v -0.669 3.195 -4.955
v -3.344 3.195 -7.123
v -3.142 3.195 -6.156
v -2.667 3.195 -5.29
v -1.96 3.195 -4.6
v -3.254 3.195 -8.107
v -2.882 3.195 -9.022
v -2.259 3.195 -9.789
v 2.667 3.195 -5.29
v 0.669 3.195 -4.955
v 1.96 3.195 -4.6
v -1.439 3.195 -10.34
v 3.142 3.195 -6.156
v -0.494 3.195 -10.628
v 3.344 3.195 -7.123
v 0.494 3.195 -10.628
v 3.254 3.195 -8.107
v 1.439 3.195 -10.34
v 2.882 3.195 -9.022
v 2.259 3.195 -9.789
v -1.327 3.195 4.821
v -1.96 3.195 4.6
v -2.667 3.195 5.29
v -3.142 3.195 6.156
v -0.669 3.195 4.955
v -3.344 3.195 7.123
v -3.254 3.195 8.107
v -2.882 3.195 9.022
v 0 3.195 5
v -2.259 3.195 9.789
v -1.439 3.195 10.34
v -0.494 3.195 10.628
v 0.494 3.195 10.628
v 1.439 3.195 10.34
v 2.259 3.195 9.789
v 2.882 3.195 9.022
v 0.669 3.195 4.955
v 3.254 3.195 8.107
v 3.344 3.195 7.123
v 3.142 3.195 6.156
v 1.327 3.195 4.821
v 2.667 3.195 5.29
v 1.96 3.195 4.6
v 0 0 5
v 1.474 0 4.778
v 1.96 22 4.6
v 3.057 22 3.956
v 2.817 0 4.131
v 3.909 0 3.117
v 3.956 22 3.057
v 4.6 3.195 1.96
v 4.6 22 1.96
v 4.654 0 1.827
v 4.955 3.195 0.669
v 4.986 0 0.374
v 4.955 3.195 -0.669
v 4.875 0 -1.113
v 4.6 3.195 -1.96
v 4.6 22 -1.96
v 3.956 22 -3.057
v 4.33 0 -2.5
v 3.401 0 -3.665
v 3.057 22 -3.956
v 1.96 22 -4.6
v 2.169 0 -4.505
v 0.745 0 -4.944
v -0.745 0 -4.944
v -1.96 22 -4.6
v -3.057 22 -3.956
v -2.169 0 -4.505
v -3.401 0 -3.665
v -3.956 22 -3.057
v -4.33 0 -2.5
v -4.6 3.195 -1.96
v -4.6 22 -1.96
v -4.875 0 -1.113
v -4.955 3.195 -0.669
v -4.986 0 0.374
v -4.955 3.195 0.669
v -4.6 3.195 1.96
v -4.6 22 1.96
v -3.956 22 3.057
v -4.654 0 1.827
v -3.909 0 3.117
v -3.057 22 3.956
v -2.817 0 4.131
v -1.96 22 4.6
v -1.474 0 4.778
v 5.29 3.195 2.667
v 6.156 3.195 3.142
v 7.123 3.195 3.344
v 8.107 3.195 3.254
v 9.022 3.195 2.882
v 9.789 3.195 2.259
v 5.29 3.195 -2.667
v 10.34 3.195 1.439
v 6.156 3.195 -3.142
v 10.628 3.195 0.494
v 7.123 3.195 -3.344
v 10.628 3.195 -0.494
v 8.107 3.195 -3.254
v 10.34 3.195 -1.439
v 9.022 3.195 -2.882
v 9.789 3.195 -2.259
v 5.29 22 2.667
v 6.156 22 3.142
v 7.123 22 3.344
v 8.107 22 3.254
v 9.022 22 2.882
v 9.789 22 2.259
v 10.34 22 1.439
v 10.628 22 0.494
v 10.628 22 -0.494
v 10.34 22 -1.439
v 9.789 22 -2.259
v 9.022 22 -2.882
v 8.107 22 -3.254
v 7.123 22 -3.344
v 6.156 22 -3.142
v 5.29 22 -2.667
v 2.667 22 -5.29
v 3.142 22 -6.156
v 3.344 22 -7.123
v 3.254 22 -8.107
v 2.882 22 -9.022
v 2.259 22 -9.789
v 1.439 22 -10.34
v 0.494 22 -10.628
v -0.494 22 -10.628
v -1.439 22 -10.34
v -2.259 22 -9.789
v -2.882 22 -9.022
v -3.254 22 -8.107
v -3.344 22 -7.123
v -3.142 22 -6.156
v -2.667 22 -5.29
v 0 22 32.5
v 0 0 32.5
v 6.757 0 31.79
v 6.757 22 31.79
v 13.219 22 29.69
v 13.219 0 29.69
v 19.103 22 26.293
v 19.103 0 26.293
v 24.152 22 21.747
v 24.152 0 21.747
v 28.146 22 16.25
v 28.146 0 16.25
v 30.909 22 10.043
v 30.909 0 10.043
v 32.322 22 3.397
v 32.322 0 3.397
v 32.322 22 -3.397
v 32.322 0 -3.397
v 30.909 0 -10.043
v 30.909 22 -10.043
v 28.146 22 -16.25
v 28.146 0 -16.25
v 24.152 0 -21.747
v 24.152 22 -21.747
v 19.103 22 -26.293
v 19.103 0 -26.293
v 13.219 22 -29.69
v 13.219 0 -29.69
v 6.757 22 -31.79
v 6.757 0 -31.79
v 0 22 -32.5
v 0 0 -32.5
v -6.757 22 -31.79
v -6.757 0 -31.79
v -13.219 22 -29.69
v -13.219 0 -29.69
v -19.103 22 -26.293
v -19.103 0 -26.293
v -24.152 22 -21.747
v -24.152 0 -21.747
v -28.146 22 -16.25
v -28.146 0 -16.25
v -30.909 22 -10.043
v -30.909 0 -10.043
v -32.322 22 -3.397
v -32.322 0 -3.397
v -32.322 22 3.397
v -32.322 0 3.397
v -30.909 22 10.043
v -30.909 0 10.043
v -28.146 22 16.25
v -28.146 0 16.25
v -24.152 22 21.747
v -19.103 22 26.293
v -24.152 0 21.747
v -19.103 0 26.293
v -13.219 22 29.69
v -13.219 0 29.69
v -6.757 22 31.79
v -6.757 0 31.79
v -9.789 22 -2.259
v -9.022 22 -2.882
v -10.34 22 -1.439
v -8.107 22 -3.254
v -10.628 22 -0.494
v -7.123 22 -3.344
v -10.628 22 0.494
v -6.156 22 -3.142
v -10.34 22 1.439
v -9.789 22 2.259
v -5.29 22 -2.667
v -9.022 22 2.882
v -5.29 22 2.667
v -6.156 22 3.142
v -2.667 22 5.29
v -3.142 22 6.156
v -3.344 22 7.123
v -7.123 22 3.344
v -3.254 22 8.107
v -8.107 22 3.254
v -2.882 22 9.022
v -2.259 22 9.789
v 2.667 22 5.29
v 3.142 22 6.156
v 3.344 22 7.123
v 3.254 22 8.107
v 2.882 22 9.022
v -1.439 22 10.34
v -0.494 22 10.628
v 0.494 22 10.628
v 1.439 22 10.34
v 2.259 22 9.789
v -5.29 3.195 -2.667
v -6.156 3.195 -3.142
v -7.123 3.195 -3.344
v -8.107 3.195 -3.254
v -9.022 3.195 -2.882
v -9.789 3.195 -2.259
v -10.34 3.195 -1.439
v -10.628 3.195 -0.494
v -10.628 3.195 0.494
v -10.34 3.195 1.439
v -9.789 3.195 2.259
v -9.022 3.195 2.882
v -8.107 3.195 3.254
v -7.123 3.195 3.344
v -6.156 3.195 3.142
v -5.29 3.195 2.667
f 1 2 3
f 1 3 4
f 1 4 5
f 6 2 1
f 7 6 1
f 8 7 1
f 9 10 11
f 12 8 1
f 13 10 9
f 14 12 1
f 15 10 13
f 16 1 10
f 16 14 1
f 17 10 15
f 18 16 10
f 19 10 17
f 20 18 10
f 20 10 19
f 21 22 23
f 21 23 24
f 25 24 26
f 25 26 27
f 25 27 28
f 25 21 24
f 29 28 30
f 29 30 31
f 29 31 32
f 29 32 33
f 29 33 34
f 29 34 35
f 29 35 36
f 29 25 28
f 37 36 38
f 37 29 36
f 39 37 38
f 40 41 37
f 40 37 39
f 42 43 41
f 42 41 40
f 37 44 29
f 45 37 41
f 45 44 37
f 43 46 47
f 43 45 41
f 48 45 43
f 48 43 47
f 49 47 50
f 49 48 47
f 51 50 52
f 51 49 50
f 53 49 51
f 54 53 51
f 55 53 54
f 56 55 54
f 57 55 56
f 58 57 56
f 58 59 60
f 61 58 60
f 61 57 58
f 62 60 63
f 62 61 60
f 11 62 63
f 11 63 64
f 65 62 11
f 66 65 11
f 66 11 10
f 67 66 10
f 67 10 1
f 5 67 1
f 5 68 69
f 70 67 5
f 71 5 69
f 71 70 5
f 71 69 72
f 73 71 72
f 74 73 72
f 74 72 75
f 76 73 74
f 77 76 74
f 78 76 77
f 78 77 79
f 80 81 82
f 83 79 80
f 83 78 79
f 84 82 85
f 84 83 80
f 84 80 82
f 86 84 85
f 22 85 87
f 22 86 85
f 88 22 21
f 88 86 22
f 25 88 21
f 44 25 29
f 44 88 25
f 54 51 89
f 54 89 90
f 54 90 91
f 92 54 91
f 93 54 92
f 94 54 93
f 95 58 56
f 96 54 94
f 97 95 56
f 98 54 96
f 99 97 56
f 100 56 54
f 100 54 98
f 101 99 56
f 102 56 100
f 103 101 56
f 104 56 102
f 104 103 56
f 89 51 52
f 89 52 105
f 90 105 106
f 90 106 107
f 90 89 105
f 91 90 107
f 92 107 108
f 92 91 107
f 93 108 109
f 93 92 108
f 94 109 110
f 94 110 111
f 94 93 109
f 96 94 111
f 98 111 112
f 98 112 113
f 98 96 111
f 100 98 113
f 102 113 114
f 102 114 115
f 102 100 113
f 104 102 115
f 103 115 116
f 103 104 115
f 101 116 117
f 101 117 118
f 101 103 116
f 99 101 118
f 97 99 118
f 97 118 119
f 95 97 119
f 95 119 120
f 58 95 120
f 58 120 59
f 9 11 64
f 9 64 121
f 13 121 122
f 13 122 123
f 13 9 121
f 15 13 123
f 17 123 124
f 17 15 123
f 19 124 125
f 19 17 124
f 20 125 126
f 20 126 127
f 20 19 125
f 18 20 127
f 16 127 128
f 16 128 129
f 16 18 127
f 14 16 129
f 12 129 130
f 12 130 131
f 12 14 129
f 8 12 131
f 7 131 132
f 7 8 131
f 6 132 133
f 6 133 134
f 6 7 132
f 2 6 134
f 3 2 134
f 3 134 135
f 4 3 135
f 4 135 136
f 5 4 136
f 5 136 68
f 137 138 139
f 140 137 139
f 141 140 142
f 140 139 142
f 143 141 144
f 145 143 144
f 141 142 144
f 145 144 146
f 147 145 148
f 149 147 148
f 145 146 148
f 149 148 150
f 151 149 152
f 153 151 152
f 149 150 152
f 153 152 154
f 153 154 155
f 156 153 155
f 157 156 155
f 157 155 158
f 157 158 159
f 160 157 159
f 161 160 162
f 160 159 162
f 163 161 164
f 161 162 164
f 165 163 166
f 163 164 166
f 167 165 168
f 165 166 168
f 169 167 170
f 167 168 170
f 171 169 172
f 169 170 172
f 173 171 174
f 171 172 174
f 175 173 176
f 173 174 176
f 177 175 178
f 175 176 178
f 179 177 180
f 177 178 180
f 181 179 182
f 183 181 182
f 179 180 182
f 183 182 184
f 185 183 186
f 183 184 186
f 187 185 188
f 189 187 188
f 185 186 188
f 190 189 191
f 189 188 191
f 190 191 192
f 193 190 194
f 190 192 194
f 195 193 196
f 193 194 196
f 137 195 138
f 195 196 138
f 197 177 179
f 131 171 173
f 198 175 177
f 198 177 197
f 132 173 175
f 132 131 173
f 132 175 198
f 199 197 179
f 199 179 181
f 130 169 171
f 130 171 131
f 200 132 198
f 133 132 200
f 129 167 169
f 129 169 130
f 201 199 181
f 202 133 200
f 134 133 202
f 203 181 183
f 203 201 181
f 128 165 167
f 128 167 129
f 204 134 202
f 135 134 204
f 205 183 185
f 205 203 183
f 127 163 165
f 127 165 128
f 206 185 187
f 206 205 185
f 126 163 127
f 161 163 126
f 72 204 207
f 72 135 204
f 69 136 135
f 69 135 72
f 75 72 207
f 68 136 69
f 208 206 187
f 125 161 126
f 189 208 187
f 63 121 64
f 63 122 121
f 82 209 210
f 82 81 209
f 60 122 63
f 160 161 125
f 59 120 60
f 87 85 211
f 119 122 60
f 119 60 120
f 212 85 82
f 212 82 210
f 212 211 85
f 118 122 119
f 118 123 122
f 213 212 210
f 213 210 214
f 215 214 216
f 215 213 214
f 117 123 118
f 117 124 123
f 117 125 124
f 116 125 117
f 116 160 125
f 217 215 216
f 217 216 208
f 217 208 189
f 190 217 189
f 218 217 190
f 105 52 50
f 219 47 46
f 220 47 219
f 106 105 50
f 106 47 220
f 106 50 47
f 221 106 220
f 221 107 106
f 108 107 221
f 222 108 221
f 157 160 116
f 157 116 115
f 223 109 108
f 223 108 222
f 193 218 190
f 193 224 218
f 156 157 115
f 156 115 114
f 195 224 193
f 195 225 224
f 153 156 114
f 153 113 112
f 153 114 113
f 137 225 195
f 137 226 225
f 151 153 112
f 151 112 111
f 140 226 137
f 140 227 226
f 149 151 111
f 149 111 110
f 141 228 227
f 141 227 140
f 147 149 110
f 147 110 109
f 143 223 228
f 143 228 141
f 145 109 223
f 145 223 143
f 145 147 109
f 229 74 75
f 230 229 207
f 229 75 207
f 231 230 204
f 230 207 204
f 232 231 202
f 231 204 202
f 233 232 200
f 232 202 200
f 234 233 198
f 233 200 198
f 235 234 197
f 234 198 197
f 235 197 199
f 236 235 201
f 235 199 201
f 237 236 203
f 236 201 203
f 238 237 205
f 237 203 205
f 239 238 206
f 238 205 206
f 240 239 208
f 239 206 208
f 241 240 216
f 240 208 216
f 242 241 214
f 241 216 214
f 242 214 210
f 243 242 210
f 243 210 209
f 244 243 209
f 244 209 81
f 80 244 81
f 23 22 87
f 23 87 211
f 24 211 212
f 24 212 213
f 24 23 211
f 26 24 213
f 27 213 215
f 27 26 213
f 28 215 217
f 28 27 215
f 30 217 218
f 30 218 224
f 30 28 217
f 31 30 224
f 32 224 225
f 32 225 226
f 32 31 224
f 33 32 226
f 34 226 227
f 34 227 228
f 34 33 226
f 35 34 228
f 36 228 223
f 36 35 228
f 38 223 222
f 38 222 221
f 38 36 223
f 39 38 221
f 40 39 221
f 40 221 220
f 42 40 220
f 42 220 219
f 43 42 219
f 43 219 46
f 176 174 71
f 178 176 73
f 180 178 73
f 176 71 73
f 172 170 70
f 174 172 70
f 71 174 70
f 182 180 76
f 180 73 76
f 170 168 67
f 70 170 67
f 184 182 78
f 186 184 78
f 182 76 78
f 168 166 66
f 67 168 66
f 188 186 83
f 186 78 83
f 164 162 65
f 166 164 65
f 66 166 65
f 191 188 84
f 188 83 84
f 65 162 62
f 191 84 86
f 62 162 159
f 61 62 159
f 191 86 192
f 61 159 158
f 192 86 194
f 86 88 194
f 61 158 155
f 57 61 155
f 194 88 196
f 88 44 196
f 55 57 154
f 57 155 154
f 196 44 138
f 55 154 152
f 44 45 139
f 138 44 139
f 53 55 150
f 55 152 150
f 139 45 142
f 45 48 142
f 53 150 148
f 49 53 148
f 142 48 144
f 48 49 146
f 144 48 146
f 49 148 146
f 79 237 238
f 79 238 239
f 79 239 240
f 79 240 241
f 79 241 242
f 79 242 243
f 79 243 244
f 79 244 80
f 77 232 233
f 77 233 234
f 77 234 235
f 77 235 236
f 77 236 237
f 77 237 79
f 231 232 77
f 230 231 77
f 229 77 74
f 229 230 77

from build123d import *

# Parameters (mm, degrees)
SKETCH1_R           = 32.5
BOSS_EXTRUDE1_DEPTH = 22
SKETCH2_R           = 5
CUT_EXTRUDE1_DEPTH  = 51.955863254
SKETCH3_R           = 3.349250155
CUT_EXTRUDE2_DEPTH  = 18.804912895
CIRPATTERN1_COUNT   = 4


with BuildPart() as part:
    # Sketch1 → Boss-Extrude1 (new body)
    with BuildSketch(Plane(origin=(0, 0, 0), x_dir=(1, 0, 0), z_dir=(0, 1, 0))):
        Circle(SKETCH1_R)
    extrude(amount=BOSS_EXTRUDE1_DEPTH)

    # Sketch2 → Cut-Extrude1 (cut, through all)
    with BuildSketch(Plane(origin=(0, 0, 0), x_dir=(1, 0, 0), z_dir=(0, 1, 0))):
        Circle(SKETCH2_R)
    extrude(amount=CUT_EXTRUDE1_DEPTH, mode=Mode.SUBTRACT)

    # Sketch3 → Cut-Extrude2 (cut)
    with BuildSketch(Plane(origin=(0, 22, 0), x_dir=(1, 0, 0), z_dir=(0, 1, 0))):
        with Locations((-7.315673523, 0)):
            Circle(SKETCH3_R)
    cut_extrude2 = extrude(amount=-CUT_EXTRUDE2_DEPTH, mode=Mode.SUBTRACT)

    # CirPattern1: Cut-Extrude2 ×4 about axis
    cirpattern1_axis = Axis((0, 0, 0), (0, 1, 0))
    for i in range(1, CIRPATTERN1_COUNT):
        add(cut_extrude2.rotate(cirpattern1_axis, i * 360 / CIRPATTERN1_COUNT), mode=Mode.SUBTRACT)


solid = part.part
